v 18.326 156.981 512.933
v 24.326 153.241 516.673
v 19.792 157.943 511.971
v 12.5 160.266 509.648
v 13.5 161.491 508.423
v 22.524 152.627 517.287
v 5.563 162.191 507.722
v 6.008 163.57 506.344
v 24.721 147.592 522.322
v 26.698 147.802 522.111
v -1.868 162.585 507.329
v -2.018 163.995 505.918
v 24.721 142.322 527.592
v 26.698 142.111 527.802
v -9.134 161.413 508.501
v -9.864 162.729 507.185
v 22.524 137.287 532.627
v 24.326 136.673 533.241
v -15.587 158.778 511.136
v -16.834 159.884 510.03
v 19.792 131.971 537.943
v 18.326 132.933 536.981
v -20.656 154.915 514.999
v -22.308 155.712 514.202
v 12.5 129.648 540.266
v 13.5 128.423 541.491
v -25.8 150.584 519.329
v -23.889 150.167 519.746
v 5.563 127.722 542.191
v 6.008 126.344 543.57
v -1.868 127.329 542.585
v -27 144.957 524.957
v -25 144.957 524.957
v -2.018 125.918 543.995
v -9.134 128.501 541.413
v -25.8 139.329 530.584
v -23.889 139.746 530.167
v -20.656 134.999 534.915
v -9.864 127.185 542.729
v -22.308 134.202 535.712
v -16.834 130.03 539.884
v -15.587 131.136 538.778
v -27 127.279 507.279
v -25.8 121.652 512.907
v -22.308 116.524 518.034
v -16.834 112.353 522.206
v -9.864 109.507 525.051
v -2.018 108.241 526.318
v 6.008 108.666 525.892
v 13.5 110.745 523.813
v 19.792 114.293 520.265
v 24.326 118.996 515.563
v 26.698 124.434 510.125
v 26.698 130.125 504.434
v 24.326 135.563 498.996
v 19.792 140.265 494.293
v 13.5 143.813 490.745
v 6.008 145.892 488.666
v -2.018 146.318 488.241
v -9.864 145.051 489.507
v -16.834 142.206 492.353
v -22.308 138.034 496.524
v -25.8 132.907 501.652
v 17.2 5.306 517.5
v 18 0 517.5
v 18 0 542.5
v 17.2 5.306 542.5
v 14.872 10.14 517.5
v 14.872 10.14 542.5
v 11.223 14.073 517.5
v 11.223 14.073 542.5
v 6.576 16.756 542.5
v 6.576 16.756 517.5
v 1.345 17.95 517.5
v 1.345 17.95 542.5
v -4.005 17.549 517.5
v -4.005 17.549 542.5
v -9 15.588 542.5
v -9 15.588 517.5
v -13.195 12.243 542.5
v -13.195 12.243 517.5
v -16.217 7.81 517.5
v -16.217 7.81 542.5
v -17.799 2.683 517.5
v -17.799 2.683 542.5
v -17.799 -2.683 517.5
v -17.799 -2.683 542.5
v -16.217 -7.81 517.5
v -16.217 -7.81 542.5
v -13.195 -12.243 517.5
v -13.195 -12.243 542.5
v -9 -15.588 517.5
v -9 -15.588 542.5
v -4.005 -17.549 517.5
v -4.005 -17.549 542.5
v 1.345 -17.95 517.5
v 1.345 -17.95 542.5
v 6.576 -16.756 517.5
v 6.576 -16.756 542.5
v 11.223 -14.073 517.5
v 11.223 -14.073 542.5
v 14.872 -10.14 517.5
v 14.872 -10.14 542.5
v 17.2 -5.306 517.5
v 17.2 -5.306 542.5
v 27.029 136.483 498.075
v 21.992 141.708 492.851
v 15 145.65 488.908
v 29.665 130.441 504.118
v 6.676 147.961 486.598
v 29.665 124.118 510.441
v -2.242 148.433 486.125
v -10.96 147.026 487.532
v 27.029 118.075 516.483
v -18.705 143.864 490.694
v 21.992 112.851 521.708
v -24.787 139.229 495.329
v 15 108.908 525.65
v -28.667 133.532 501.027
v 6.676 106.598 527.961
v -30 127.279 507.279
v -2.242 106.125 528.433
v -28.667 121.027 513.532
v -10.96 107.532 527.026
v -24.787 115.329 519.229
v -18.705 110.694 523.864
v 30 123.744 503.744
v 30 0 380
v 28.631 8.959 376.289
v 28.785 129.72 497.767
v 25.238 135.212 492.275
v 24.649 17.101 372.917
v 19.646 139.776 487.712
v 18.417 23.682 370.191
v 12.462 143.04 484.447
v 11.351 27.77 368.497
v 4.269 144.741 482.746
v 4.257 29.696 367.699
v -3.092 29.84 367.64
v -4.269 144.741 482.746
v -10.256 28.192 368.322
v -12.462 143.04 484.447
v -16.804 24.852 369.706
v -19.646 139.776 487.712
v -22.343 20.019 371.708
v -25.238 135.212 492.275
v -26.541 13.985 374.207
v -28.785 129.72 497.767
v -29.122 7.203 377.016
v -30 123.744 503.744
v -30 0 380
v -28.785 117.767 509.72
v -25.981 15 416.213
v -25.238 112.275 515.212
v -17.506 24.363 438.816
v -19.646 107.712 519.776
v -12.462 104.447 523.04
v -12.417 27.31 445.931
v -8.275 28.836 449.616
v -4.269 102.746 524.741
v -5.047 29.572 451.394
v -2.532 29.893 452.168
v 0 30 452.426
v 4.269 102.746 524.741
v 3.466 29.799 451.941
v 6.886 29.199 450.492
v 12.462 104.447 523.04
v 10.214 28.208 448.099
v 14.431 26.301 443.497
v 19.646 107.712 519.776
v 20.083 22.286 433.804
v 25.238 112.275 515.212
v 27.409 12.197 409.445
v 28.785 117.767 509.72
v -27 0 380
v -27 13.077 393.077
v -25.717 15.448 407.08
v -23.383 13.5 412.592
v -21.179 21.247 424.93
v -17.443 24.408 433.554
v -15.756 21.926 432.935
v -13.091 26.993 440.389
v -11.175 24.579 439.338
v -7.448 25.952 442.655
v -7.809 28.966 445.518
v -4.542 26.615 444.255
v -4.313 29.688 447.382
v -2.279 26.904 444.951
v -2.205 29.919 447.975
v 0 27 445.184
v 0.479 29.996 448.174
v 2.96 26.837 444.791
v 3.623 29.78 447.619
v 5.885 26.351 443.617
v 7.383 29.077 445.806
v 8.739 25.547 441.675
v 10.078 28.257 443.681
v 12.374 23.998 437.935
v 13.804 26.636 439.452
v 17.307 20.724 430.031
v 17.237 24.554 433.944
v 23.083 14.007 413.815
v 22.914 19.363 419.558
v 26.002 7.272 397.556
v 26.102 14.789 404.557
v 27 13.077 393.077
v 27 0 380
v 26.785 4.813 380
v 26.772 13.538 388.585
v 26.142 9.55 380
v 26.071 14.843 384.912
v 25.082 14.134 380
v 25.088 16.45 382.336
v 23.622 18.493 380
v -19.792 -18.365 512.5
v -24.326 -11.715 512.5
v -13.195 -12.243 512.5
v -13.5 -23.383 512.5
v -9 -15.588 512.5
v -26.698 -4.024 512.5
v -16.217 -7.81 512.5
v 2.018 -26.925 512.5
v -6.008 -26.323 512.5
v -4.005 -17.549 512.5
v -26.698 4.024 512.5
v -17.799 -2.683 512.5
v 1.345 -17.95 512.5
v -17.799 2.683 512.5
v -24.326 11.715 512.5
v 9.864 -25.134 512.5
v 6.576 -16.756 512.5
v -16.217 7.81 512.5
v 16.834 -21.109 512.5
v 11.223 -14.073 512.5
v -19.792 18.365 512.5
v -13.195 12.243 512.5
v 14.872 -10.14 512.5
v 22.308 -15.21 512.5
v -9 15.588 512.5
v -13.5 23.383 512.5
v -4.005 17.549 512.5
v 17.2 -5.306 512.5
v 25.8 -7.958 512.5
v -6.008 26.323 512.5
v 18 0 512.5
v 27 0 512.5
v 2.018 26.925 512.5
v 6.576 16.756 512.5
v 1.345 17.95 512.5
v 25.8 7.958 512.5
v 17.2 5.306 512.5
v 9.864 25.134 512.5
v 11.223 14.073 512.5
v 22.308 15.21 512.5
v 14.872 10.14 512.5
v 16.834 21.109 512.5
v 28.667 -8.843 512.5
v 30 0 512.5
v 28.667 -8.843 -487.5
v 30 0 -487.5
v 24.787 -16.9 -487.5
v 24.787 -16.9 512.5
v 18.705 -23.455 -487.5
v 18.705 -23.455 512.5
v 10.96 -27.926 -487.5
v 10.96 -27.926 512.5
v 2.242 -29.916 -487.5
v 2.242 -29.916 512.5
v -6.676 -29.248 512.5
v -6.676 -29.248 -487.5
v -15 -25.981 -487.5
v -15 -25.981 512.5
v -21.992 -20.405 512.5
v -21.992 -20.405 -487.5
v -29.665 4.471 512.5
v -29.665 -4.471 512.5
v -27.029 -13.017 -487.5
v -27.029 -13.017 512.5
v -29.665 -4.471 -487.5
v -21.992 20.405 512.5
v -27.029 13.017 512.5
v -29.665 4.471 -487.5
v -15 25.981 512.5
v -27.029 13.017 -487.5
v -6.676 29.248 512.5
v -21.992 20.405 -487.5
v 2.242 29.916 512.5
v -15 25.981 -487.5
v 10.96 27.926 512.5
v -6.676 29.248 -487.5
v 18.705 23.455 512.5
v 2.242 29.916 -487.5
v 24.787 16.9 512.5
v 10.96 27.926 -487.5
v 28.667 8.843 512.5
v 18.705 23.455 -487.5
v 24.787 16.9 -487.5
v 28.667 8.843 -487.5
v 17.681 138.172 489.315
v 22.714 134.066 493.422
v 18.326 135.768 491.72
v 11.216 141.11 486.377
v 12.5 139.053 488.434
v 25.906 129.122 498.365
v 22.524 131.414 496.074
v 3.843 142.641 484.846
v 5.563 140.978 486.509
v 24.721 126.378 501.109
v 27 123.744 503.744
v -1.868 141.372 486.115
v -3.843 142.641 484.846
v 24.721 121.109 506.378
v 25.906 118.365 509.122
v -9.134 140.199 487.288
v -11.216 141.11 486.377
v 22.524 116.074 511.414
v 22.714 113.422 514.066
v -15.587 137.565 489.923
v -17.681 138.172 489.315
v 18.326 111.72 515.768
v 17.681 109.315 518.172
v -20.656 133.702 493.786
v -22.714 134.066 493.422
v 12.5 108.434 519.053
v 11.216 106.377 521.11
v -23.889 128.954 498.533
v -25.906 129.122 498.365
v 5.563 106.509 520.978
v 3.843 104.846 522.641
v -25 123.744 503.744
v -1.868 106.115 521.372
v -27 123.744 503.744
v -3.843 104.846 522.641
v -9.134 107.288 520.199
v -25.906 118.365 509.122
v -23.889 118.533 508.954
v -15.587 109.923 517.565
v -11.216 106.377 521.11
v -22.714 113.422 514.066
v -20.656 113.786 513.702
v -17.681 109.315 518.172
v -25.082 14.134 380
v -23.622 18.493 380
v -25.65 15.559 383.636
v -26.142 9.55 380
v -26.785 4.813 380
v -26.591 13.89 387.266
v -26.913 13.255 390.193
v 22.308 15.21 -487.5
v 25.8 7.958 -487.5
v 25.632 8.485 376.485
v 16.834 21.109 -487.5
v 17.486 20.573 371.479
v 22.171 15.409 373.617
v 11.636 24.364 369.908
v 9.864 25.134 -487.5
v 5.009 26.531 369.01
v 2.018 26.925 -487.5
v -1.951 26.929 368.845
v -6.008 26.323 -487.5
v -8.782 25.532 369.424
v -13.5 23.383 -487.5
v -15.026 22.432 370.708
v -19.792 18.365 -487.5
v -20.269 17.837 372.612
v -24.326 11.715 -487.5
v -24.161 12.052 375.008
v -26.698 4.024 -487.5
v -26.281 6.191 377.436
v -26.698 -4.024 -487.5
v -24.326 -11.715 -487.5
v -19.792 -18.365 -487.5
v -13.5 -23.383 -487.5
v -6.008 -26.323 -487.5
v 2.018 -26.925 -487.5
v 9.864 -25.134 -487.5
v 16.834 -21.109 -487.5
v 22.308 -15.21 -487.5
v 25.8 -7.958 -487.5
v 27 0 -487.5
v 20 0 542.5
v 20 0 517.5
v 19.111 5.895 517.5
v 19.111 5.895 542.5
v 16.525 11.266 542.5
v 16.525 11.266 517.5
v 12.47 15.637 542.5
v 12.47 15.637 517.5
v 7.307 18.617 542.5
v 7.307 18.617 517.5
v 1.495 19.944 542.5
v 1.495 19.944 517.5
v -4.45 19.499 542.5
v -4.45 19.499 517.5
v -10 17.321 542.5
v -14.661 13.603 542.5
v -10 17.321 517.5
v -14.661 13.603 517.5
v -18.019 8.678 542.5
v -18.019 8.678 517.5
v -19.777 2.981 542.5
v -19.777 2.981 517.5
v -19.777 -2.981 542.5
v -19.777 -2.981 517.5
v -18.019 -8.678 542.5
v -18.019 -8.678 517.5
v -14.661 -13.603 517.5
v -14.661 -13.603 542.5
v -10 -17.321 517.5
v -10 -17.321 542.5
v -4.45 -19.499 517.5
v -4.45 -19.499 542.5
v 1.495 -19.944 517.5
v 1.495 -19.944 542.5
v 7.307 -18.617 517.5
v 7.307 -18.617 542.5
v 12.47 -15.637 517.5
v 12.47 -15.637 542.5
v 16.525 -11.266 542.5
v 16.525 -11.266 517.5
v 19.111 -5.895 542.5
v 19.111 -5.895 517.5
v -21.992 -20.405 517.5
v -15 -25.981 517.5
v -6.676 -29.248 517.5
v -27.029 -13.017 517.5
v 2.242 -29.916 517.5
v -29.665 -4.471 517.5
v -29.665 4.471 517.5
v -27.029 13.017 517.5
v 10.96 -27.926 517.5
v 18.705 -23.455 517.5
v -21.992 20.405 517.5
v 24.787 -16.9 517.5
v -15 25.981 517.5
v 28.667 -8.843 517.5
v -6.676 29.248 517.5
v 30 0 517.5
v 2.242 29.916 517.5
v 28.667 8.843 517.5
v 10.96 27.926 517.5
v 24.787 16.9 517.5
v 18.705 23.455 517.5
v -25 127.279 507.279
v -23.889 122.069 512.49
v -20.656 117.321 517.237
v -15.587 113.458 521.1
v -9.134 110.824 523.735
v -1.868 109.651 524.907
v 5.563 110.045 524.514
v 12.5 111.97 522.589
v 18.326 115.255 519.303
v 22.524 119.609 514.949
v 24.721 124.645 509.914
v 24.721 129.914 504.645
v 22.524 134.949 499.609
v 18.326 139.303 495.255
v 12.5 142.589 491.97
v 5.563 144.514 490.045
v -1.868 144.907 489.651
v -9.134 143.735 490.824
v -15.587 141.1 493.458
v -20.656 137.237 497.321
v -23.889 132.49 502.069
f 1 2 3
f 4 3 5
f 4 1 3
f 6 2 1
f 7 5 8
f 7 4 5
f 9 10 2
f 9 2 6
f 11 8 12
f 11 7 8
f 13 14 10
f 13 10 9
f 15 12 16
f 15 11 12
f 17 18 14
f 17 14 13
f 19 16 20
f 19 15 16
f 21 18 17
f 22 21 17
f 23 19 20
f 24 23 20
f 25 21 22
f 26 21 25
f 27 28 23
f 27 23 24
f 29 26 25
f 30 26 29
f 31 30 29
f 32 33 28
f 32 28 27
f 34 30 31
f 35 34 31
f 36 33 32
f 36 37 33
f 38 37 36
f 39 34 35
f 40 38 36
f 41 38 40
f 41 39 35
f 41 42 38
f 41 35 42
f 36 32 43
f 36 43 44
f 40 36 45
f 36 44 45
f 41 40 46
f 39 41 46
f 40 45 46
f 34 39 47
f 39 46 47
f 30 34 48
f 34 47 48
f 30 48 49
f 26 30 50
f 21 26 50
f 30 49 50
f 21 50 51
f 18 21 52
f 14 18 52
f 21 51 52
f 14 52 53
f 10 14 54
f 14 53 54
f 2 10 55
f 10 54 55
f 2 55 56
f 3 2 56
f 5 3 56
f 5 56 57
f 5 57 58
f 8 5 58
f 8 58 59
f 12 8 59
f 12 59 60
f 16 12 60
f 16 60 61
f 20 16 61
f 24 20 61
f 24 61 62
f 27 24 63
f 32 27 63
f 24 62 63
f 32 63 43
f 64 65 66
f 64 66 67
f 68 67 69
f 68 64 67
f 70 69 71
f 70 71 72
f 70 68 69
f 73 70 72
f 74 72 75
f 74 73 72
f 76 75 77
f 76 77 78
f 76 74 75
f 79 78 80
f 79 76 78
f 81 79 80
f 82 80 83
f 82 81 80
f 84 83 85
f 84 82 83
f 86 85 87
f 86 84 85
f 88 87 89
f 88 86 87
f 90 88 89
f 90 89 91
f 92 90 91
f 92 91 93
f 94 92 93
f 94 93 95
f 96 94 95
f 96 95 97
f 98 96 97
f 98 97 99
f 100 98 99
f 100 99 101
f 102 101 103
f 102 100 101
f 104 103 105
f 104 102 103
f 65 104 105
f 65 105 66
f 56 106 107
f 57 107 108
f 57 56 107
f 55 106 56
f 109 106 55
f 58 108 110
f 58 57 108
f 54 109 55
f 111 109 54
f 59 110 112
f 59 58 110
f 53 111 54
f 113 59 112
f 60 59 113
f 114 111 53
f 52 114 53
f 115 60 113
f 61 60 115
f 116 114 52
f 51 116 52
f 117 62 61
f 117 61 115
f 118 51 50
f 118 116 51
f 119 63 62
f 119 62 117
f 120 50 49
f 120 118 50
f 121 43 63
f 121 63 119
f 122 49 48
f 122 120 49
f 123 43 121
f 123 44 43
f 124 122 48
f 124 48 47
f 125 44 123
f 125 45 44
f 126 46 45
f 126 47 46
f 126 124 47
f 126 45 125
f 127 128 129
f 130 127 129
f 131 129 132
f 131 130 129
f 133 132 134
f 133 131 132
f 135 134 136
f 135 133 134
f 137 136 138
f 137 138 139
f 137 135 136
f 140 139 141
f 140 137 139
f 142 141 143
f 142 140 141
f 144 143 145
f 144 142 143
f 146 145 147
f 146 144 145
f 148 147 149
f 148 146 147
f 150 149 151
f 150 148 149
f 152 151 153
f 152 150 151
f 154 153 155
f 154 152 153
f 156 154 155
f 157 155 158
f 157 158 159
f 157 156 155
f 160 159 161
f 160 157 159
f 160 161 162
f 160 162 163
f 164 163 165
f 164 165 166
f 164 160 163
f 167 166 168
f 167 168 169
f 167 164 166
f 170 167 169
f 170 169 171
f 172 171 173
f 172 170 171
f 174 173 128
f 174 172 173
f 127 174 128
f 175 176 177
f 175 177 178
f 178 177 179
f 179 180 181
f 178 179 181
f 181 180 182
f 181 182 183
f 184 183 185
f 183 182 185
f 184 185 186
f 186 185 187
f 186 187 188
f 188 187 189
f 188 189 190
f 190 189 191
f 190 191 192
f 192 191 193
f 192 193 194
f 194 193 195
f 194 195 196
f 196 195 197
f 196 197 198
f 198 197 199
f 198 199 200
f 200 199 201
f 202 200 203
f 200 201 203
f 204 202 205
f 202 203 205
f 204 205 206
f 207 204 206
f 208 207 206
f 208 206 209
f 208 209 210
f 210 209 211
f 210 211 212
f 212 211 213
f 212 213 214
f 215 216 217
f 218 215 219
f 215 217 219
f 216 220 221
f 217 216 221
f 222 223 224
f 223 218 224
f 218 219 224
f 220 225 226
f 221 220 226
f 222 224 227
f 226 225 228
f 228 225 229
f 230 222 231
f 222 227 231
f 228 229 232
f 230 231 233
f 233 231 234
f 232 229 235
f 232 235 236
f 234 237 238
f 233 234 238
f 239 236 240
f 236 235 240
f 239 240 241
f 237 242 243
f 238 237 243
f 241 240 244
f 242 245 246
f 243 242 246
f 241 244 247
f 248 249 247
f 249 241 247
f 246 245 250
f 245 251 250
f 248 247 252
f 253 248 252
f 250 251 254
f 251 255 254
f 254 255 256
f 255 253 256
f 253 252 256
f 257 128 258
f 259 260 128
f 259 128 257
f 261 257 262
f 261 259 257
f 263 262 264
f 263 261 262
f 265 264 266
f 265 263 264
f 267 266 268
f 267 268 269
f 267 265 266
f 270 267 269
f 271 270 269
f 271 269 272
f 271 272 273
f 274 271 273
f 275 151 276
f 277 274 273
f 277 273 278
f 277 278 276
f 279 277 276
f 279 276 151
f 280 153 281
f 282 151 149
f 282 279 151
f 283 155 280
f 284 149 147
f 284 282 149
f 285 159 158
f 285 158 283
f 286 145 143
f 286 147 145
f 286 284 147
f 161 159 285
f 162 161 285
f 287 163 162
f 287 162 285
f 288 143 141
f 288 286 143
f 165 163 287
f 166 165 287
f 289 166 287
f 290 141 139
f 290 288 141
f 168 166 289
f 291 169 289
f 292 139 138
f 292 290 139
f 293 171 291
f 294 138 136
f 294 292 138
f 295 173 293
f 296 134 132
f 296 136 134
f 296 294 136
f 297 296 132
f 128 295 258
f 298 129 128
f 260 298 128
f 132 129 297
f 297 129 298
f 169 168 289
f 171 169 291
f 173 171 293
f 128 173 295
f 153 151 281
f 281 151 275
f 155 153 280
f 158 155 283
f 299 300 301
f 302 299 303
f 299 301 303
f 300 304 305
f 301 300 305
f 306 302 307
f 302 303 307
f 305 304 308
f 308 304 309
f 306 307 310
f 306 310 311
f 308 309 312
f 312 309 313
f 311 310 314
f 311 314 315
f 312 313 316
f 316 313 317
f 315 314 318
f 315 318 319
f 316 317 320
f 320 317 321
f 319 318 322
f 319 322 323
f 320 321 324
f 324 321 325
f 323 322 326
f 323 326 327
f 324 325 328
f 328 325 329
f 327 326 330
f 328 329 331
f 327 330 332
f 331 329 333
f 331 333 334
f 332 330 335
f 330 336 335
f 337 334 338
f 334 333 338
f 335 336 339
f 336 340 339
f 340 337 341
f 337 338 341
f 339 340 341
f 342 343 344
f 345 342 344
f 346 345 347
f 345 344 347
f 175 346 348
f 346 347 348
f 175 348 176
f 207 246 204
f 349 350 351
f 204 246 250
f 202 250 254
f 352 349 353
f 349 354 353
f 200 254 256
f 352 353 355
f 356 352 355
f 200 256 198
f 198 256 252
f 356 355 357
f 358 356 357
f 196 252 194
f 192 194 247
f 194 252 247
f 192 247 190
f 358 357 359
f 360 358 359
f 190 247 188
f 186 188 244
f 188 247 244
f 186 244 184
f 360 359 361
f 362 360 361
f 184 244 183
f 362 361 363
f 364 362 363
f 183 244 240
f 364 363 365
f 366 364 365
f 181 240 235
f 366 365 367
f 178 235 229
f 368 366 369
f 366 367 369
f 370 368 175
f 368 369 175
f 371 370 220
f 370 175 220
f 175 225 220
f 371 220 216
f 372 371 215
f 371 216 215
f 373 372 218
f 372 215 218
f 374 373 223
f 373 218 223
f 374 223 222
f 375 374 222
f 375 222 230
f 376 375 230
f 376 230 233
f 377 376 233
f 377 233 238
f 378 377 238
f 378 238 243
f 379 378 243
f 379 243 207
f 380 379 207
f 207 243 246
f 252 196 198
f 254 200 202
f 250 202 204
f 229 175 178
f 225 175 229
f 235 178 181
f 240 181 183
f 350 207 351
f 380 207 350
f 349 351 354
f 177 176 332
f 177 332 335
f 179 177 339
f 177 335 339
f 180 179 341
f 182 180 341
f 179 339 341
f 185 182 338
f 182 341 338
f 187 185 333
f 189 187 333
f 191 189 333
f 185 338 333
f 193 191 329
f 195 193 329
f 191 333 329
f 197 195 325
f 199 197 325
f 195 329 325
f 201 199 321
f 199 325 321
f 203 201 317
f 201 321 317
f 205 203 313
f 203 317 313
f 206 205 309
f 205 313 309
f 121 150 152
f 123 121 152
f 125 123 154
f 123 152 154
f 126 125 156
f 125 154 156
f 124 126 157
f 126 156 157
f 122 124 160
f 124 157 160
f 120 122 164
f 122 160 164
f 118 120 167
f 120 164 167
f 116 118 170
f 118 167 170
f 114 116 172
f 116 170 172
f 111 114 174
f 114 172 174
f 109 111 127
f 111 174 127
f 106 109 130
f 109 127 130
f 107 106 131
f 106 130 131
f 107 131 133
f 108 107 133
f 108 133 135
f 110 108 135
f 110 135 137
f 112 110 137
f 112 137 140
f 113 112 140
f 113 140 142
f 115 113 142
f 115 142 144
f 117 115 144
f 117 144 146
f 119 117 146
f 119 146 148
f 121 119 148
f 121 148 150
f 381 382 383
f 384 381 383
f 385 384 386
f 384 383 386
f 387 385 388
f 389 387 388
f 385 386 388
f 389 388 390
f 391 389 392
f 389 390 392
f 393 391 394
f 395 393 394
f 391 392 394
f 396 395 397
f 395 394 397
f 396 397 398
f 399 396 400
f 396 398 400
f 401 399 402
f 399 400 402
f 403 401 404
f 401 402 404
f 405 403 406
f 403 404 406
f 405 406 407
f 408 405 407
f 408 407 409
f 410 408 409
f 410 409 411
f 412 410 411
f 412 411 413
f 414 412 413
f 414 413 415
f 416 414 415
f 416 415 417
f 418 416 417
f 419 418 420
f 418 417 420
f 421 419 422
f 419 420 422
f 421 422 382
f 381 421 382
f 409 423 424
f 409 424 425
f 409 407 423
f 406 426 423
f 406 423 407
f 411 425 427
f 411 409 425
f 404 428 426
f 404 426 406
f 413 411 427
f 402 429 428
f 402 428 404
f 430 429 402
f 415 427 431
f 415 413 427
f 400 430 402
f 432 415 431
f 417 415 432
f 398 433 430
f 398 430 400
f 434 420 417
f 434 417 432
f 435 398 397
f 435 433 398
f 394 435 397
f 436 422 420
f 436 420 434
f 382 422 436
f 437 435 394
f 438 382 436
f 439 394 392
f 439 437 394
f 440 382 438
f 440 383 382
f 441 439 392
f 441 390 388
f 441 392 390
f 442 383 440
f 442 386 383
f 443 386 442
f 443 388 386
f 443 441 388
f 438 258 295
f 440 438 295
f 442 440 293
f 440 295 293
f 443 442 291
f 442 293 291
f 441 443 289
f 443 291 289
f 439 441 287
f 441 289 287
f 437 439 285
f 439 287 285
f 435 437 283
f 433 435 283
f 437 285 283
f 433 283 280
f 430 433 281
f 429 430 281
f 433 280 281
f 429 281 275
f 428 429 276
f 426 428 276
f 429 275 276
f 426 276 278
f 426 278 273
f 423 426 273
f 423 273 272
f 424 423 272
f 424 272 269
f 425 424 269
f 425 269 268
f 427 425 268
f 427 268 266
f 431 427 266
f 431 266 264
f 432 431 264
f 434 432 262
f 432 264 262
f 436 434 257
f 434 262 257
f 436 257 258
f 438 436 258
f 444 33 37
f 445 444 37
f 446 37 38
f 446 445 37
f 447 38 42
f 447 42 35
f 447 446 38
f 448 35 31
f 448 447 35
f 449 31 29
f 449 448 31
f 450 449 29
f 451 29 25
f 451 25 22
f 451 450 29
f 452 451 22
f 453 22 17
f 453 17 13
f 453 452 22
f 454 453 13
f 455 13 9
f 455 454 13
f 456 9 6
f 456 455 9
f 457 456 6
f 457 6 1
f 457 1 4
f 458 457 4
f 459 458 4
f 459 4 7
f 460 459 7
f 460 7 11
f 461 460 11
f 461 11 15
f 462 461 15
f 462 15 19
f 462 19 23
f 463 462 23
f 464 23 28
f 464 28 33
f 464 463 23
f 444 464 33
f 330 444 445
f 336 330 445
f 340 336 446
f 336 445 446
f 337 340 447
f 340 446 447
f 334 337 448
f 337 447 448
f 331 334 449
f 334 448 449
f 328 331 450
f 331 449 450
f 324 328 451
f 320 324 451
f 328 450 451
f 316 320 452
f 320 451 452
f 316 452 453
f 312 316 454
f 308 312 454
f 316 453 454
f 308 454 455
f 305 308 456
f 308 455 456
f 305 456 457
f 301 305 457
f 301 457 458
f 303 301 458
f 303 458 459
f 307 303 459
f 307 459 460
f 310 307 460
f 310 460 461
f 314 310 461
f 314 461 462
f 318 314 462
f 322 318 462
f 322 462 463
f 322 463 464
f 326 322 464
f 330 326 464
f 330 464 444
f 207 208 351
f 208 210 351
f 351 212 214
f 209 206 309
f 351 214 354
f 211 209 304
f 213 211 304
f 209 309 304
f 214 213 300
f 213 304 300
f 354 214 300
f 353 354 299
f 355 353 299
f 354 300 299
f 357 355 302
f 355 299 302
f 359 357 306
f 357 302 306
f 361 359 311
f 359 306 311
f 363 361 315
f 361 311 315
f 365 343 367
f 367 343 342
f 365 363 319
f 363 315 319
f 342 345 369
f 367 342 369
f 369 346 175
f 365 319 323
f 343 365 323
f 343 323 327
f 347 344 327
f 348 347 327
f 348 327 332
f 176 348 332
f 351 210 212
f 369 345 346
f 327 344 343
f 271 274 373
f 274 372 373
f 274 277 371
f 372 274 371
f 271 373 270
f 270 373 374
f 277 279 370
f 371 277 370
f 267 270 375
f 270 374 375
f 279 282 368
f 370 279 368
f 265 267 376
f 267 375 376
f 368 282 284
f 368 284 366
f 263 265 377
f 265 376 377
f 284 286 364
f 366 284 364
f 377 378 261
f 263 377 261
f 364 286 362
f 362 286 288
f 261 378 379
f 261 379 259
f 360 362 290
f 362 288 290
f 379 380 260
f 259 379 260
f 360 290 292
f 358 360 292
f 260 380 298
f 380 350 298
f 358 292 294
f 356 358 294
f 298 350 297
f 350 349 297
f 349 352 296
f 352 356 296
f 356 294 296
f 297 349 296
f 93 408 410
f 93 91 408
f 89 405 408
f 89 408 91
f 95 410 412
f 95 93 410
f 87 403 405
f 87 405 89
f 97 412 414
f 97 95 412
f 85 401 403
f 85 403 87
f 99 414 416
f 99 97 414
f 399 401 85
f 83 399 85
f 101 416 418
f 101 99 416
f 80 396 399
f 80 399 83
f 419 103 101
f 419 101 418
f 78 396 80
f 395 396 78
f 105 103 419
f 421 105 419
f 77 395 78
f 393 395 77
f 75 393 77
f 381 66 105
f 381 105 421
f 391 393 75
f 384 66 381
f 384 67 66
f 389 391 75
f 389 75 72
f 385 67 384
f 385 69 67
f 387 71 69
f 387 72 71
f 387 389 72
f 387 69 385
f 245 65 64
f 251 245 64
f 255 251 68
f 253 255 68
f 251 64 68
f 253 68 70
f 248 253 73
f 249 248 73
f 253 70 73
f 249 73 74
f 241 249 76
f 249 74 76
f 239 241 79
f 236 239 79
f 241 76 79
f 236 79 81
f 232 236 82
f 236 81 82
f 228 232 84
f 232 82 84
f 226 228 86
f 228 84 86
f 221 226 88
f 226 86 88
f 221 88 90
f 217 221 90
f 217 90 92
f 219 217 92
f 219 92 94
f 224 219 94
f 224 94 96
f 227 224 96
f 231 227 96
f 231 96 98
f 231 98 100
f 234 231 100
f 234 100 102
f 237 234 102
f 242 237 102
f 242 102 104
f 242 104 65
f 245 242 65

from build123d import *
from build123d import SkipClean  # not in build123d's __all__

# Parameters (mm, degrees)
F3_R      = 30
F3_R_2    = 27
F5_R      = 30
F5_R_2    = 27
F7_R      = 27
F8_DEPTH  = 1000.001
F9_R      = 27
F10_REACH = 885.9968684831
F11_R     = 30
F11_R_2   = 27
F12_DEPTH = 5
F13_R     = 20
F13_R_2   = 18
F14_DEPTH = 25
F15_R     = 18
F16_DEPTH = 25
F17_R     = 30
F17_R_2   = 27
F18_DEPTH = 5
F19_R     = 27
F19_R_2   = 25
F20_DEPTH = 25
F21_R     = 25
F22_DEPTH = 25


with BuildPart() as f4:
    # F4: sweep along a path in F0
    with BuildLine(Plane.YZ) as f4_path:
        Line((0, -487.5), (0, 380))
        Line((0, 380), (123.7436867076, 503.7436867076))
    # F3 (on plane+point) → F4 (sweep)
    with BuildSketch(Plane.XY.offset(-487.5)):
        Circle(F3_R)
        Circle(F3_R_2, mode=Mode.SUBTRACT)
    sweep(path=f4_path.line, transition=Transition.RIGHT)

    # F6: sweep along a path in F0
    with BuildLine(Plane.YZ) as f6_path:
        Line((0, 512.5), (0, 380))
    # F5 (on plane+point) → F6 (sweep)
    with BuildSketch(Plane.XY.offset(380)):
        Circle(F5_R)
        Circle(F5_R_2, mode=Mode.SUBTRACT)
    sweep(path=f6_path.line)

    # F7 (on face) → F8 (cut, through all)
    with BuildSketch(Plane.XY.offset(512.5)):
        Circle(F7_R)
    extrude(amount=-F8_DEPTH, mode=Mode.SUBTRACT)

    f10_end = f4.faces().sort_by_distance((-27, 0, 12.5))[0]
    # F9 (on face) → F10 (cut, up to a face of the model that its end follows)
    with BuildSketch(Plane(origin=(0, 313.7436867076, 313.7436867076), x_dir=(-1, 0, 0), z_dir=(0, 0.7071067812, 0.7071067812))):
        with Locations((0, 268.7005768509)):
            Circle(F9_R)
    f10_long = extrude(amount=-F10_REACH, mode=Mode.PRIVATE)
    add(split(f10_long, bisect_by=f10_end, keep=Keep.TOP, mode=Mode.PRIVATE), mode=Mode.SUBTRACT)

    # F11 (on face) → F12 (join)
    with BuildSketch(Plane.XY.offset(512.5)):
        Circle(F11_R)
        Circle(F11_R_2, mode=Mode.SUBTRACT)
        Circle(F11_R_2)
    with SkipClean():  # cleaning this boolean's faces spoils the solid; the shape is the same uncleaned
        extrude(amount=F12_DEPTH)

    # F13 (on face) → F14 (join)
    with BuildSketch(Plane.XY.offset(517.5)):
        Circle(F13_R)
        Circle(F13_R_2, mode=Mode.SUBTRACT)
    extrude(amount=F14_DEPTH)

    # F15 (on face) → F16 (cut)
    with BuildSketch(Plane.XY.offset(517.5)):
        Circle(F15_R)
    extrude(amount=-F16_DEPTH, mode=Mode.SUBTRACT)

    # F17 (on face) → F18 (join)
    with BuildSketch(Plane(origin=(0, 313.7436867076, 313.7436867076), x_dir=(-1, 0, 0), z_dir=(0, 0.7071067812, 0.7071067812))):
        with Locations((0, 268.7005768509)):
            Circle(F17_R)
        with Locations((0, 268.7005768509)):
            Circle(F17_R_2, mode=Mode.SUBTRACT)
        with Locations((0, 268.7005768509)):
            Circle(F17_R_2)
    extrude(amount=F18_DEPTH)

    # F19 (on face) → F20 (join)
    with BuildSketch(Plane(origin=(0, 317.2792206136, 317.2792206136), x_dir=(-1, 0, 0), z_dir=(0, 0.7071067812, 0.7071067812))):
        with Locations((0, 268.7005768509)):
            Circle(F19_R)
        with Locations((0, 268.7005768509)):
            Circle(F19_R_2, mode=Mode.SUBTRACT)
    extrude(amount=F20_DEPTH)

    # F21 (on face) → F22 (cut)
    with BuildSketch(Plane(origin=(0, 317.2792206136, 317.2792206136), x_dir=(-1, 0, 0), z_dir=(0, 0.7071067812, 0.7071067812))):
        with Locations((0, 268.7005768509)):
            Circle(F21_R)
    extrude(amount=-F22_DEPTH, mode=Mode.SUBTRACT)


solid = f4.part
